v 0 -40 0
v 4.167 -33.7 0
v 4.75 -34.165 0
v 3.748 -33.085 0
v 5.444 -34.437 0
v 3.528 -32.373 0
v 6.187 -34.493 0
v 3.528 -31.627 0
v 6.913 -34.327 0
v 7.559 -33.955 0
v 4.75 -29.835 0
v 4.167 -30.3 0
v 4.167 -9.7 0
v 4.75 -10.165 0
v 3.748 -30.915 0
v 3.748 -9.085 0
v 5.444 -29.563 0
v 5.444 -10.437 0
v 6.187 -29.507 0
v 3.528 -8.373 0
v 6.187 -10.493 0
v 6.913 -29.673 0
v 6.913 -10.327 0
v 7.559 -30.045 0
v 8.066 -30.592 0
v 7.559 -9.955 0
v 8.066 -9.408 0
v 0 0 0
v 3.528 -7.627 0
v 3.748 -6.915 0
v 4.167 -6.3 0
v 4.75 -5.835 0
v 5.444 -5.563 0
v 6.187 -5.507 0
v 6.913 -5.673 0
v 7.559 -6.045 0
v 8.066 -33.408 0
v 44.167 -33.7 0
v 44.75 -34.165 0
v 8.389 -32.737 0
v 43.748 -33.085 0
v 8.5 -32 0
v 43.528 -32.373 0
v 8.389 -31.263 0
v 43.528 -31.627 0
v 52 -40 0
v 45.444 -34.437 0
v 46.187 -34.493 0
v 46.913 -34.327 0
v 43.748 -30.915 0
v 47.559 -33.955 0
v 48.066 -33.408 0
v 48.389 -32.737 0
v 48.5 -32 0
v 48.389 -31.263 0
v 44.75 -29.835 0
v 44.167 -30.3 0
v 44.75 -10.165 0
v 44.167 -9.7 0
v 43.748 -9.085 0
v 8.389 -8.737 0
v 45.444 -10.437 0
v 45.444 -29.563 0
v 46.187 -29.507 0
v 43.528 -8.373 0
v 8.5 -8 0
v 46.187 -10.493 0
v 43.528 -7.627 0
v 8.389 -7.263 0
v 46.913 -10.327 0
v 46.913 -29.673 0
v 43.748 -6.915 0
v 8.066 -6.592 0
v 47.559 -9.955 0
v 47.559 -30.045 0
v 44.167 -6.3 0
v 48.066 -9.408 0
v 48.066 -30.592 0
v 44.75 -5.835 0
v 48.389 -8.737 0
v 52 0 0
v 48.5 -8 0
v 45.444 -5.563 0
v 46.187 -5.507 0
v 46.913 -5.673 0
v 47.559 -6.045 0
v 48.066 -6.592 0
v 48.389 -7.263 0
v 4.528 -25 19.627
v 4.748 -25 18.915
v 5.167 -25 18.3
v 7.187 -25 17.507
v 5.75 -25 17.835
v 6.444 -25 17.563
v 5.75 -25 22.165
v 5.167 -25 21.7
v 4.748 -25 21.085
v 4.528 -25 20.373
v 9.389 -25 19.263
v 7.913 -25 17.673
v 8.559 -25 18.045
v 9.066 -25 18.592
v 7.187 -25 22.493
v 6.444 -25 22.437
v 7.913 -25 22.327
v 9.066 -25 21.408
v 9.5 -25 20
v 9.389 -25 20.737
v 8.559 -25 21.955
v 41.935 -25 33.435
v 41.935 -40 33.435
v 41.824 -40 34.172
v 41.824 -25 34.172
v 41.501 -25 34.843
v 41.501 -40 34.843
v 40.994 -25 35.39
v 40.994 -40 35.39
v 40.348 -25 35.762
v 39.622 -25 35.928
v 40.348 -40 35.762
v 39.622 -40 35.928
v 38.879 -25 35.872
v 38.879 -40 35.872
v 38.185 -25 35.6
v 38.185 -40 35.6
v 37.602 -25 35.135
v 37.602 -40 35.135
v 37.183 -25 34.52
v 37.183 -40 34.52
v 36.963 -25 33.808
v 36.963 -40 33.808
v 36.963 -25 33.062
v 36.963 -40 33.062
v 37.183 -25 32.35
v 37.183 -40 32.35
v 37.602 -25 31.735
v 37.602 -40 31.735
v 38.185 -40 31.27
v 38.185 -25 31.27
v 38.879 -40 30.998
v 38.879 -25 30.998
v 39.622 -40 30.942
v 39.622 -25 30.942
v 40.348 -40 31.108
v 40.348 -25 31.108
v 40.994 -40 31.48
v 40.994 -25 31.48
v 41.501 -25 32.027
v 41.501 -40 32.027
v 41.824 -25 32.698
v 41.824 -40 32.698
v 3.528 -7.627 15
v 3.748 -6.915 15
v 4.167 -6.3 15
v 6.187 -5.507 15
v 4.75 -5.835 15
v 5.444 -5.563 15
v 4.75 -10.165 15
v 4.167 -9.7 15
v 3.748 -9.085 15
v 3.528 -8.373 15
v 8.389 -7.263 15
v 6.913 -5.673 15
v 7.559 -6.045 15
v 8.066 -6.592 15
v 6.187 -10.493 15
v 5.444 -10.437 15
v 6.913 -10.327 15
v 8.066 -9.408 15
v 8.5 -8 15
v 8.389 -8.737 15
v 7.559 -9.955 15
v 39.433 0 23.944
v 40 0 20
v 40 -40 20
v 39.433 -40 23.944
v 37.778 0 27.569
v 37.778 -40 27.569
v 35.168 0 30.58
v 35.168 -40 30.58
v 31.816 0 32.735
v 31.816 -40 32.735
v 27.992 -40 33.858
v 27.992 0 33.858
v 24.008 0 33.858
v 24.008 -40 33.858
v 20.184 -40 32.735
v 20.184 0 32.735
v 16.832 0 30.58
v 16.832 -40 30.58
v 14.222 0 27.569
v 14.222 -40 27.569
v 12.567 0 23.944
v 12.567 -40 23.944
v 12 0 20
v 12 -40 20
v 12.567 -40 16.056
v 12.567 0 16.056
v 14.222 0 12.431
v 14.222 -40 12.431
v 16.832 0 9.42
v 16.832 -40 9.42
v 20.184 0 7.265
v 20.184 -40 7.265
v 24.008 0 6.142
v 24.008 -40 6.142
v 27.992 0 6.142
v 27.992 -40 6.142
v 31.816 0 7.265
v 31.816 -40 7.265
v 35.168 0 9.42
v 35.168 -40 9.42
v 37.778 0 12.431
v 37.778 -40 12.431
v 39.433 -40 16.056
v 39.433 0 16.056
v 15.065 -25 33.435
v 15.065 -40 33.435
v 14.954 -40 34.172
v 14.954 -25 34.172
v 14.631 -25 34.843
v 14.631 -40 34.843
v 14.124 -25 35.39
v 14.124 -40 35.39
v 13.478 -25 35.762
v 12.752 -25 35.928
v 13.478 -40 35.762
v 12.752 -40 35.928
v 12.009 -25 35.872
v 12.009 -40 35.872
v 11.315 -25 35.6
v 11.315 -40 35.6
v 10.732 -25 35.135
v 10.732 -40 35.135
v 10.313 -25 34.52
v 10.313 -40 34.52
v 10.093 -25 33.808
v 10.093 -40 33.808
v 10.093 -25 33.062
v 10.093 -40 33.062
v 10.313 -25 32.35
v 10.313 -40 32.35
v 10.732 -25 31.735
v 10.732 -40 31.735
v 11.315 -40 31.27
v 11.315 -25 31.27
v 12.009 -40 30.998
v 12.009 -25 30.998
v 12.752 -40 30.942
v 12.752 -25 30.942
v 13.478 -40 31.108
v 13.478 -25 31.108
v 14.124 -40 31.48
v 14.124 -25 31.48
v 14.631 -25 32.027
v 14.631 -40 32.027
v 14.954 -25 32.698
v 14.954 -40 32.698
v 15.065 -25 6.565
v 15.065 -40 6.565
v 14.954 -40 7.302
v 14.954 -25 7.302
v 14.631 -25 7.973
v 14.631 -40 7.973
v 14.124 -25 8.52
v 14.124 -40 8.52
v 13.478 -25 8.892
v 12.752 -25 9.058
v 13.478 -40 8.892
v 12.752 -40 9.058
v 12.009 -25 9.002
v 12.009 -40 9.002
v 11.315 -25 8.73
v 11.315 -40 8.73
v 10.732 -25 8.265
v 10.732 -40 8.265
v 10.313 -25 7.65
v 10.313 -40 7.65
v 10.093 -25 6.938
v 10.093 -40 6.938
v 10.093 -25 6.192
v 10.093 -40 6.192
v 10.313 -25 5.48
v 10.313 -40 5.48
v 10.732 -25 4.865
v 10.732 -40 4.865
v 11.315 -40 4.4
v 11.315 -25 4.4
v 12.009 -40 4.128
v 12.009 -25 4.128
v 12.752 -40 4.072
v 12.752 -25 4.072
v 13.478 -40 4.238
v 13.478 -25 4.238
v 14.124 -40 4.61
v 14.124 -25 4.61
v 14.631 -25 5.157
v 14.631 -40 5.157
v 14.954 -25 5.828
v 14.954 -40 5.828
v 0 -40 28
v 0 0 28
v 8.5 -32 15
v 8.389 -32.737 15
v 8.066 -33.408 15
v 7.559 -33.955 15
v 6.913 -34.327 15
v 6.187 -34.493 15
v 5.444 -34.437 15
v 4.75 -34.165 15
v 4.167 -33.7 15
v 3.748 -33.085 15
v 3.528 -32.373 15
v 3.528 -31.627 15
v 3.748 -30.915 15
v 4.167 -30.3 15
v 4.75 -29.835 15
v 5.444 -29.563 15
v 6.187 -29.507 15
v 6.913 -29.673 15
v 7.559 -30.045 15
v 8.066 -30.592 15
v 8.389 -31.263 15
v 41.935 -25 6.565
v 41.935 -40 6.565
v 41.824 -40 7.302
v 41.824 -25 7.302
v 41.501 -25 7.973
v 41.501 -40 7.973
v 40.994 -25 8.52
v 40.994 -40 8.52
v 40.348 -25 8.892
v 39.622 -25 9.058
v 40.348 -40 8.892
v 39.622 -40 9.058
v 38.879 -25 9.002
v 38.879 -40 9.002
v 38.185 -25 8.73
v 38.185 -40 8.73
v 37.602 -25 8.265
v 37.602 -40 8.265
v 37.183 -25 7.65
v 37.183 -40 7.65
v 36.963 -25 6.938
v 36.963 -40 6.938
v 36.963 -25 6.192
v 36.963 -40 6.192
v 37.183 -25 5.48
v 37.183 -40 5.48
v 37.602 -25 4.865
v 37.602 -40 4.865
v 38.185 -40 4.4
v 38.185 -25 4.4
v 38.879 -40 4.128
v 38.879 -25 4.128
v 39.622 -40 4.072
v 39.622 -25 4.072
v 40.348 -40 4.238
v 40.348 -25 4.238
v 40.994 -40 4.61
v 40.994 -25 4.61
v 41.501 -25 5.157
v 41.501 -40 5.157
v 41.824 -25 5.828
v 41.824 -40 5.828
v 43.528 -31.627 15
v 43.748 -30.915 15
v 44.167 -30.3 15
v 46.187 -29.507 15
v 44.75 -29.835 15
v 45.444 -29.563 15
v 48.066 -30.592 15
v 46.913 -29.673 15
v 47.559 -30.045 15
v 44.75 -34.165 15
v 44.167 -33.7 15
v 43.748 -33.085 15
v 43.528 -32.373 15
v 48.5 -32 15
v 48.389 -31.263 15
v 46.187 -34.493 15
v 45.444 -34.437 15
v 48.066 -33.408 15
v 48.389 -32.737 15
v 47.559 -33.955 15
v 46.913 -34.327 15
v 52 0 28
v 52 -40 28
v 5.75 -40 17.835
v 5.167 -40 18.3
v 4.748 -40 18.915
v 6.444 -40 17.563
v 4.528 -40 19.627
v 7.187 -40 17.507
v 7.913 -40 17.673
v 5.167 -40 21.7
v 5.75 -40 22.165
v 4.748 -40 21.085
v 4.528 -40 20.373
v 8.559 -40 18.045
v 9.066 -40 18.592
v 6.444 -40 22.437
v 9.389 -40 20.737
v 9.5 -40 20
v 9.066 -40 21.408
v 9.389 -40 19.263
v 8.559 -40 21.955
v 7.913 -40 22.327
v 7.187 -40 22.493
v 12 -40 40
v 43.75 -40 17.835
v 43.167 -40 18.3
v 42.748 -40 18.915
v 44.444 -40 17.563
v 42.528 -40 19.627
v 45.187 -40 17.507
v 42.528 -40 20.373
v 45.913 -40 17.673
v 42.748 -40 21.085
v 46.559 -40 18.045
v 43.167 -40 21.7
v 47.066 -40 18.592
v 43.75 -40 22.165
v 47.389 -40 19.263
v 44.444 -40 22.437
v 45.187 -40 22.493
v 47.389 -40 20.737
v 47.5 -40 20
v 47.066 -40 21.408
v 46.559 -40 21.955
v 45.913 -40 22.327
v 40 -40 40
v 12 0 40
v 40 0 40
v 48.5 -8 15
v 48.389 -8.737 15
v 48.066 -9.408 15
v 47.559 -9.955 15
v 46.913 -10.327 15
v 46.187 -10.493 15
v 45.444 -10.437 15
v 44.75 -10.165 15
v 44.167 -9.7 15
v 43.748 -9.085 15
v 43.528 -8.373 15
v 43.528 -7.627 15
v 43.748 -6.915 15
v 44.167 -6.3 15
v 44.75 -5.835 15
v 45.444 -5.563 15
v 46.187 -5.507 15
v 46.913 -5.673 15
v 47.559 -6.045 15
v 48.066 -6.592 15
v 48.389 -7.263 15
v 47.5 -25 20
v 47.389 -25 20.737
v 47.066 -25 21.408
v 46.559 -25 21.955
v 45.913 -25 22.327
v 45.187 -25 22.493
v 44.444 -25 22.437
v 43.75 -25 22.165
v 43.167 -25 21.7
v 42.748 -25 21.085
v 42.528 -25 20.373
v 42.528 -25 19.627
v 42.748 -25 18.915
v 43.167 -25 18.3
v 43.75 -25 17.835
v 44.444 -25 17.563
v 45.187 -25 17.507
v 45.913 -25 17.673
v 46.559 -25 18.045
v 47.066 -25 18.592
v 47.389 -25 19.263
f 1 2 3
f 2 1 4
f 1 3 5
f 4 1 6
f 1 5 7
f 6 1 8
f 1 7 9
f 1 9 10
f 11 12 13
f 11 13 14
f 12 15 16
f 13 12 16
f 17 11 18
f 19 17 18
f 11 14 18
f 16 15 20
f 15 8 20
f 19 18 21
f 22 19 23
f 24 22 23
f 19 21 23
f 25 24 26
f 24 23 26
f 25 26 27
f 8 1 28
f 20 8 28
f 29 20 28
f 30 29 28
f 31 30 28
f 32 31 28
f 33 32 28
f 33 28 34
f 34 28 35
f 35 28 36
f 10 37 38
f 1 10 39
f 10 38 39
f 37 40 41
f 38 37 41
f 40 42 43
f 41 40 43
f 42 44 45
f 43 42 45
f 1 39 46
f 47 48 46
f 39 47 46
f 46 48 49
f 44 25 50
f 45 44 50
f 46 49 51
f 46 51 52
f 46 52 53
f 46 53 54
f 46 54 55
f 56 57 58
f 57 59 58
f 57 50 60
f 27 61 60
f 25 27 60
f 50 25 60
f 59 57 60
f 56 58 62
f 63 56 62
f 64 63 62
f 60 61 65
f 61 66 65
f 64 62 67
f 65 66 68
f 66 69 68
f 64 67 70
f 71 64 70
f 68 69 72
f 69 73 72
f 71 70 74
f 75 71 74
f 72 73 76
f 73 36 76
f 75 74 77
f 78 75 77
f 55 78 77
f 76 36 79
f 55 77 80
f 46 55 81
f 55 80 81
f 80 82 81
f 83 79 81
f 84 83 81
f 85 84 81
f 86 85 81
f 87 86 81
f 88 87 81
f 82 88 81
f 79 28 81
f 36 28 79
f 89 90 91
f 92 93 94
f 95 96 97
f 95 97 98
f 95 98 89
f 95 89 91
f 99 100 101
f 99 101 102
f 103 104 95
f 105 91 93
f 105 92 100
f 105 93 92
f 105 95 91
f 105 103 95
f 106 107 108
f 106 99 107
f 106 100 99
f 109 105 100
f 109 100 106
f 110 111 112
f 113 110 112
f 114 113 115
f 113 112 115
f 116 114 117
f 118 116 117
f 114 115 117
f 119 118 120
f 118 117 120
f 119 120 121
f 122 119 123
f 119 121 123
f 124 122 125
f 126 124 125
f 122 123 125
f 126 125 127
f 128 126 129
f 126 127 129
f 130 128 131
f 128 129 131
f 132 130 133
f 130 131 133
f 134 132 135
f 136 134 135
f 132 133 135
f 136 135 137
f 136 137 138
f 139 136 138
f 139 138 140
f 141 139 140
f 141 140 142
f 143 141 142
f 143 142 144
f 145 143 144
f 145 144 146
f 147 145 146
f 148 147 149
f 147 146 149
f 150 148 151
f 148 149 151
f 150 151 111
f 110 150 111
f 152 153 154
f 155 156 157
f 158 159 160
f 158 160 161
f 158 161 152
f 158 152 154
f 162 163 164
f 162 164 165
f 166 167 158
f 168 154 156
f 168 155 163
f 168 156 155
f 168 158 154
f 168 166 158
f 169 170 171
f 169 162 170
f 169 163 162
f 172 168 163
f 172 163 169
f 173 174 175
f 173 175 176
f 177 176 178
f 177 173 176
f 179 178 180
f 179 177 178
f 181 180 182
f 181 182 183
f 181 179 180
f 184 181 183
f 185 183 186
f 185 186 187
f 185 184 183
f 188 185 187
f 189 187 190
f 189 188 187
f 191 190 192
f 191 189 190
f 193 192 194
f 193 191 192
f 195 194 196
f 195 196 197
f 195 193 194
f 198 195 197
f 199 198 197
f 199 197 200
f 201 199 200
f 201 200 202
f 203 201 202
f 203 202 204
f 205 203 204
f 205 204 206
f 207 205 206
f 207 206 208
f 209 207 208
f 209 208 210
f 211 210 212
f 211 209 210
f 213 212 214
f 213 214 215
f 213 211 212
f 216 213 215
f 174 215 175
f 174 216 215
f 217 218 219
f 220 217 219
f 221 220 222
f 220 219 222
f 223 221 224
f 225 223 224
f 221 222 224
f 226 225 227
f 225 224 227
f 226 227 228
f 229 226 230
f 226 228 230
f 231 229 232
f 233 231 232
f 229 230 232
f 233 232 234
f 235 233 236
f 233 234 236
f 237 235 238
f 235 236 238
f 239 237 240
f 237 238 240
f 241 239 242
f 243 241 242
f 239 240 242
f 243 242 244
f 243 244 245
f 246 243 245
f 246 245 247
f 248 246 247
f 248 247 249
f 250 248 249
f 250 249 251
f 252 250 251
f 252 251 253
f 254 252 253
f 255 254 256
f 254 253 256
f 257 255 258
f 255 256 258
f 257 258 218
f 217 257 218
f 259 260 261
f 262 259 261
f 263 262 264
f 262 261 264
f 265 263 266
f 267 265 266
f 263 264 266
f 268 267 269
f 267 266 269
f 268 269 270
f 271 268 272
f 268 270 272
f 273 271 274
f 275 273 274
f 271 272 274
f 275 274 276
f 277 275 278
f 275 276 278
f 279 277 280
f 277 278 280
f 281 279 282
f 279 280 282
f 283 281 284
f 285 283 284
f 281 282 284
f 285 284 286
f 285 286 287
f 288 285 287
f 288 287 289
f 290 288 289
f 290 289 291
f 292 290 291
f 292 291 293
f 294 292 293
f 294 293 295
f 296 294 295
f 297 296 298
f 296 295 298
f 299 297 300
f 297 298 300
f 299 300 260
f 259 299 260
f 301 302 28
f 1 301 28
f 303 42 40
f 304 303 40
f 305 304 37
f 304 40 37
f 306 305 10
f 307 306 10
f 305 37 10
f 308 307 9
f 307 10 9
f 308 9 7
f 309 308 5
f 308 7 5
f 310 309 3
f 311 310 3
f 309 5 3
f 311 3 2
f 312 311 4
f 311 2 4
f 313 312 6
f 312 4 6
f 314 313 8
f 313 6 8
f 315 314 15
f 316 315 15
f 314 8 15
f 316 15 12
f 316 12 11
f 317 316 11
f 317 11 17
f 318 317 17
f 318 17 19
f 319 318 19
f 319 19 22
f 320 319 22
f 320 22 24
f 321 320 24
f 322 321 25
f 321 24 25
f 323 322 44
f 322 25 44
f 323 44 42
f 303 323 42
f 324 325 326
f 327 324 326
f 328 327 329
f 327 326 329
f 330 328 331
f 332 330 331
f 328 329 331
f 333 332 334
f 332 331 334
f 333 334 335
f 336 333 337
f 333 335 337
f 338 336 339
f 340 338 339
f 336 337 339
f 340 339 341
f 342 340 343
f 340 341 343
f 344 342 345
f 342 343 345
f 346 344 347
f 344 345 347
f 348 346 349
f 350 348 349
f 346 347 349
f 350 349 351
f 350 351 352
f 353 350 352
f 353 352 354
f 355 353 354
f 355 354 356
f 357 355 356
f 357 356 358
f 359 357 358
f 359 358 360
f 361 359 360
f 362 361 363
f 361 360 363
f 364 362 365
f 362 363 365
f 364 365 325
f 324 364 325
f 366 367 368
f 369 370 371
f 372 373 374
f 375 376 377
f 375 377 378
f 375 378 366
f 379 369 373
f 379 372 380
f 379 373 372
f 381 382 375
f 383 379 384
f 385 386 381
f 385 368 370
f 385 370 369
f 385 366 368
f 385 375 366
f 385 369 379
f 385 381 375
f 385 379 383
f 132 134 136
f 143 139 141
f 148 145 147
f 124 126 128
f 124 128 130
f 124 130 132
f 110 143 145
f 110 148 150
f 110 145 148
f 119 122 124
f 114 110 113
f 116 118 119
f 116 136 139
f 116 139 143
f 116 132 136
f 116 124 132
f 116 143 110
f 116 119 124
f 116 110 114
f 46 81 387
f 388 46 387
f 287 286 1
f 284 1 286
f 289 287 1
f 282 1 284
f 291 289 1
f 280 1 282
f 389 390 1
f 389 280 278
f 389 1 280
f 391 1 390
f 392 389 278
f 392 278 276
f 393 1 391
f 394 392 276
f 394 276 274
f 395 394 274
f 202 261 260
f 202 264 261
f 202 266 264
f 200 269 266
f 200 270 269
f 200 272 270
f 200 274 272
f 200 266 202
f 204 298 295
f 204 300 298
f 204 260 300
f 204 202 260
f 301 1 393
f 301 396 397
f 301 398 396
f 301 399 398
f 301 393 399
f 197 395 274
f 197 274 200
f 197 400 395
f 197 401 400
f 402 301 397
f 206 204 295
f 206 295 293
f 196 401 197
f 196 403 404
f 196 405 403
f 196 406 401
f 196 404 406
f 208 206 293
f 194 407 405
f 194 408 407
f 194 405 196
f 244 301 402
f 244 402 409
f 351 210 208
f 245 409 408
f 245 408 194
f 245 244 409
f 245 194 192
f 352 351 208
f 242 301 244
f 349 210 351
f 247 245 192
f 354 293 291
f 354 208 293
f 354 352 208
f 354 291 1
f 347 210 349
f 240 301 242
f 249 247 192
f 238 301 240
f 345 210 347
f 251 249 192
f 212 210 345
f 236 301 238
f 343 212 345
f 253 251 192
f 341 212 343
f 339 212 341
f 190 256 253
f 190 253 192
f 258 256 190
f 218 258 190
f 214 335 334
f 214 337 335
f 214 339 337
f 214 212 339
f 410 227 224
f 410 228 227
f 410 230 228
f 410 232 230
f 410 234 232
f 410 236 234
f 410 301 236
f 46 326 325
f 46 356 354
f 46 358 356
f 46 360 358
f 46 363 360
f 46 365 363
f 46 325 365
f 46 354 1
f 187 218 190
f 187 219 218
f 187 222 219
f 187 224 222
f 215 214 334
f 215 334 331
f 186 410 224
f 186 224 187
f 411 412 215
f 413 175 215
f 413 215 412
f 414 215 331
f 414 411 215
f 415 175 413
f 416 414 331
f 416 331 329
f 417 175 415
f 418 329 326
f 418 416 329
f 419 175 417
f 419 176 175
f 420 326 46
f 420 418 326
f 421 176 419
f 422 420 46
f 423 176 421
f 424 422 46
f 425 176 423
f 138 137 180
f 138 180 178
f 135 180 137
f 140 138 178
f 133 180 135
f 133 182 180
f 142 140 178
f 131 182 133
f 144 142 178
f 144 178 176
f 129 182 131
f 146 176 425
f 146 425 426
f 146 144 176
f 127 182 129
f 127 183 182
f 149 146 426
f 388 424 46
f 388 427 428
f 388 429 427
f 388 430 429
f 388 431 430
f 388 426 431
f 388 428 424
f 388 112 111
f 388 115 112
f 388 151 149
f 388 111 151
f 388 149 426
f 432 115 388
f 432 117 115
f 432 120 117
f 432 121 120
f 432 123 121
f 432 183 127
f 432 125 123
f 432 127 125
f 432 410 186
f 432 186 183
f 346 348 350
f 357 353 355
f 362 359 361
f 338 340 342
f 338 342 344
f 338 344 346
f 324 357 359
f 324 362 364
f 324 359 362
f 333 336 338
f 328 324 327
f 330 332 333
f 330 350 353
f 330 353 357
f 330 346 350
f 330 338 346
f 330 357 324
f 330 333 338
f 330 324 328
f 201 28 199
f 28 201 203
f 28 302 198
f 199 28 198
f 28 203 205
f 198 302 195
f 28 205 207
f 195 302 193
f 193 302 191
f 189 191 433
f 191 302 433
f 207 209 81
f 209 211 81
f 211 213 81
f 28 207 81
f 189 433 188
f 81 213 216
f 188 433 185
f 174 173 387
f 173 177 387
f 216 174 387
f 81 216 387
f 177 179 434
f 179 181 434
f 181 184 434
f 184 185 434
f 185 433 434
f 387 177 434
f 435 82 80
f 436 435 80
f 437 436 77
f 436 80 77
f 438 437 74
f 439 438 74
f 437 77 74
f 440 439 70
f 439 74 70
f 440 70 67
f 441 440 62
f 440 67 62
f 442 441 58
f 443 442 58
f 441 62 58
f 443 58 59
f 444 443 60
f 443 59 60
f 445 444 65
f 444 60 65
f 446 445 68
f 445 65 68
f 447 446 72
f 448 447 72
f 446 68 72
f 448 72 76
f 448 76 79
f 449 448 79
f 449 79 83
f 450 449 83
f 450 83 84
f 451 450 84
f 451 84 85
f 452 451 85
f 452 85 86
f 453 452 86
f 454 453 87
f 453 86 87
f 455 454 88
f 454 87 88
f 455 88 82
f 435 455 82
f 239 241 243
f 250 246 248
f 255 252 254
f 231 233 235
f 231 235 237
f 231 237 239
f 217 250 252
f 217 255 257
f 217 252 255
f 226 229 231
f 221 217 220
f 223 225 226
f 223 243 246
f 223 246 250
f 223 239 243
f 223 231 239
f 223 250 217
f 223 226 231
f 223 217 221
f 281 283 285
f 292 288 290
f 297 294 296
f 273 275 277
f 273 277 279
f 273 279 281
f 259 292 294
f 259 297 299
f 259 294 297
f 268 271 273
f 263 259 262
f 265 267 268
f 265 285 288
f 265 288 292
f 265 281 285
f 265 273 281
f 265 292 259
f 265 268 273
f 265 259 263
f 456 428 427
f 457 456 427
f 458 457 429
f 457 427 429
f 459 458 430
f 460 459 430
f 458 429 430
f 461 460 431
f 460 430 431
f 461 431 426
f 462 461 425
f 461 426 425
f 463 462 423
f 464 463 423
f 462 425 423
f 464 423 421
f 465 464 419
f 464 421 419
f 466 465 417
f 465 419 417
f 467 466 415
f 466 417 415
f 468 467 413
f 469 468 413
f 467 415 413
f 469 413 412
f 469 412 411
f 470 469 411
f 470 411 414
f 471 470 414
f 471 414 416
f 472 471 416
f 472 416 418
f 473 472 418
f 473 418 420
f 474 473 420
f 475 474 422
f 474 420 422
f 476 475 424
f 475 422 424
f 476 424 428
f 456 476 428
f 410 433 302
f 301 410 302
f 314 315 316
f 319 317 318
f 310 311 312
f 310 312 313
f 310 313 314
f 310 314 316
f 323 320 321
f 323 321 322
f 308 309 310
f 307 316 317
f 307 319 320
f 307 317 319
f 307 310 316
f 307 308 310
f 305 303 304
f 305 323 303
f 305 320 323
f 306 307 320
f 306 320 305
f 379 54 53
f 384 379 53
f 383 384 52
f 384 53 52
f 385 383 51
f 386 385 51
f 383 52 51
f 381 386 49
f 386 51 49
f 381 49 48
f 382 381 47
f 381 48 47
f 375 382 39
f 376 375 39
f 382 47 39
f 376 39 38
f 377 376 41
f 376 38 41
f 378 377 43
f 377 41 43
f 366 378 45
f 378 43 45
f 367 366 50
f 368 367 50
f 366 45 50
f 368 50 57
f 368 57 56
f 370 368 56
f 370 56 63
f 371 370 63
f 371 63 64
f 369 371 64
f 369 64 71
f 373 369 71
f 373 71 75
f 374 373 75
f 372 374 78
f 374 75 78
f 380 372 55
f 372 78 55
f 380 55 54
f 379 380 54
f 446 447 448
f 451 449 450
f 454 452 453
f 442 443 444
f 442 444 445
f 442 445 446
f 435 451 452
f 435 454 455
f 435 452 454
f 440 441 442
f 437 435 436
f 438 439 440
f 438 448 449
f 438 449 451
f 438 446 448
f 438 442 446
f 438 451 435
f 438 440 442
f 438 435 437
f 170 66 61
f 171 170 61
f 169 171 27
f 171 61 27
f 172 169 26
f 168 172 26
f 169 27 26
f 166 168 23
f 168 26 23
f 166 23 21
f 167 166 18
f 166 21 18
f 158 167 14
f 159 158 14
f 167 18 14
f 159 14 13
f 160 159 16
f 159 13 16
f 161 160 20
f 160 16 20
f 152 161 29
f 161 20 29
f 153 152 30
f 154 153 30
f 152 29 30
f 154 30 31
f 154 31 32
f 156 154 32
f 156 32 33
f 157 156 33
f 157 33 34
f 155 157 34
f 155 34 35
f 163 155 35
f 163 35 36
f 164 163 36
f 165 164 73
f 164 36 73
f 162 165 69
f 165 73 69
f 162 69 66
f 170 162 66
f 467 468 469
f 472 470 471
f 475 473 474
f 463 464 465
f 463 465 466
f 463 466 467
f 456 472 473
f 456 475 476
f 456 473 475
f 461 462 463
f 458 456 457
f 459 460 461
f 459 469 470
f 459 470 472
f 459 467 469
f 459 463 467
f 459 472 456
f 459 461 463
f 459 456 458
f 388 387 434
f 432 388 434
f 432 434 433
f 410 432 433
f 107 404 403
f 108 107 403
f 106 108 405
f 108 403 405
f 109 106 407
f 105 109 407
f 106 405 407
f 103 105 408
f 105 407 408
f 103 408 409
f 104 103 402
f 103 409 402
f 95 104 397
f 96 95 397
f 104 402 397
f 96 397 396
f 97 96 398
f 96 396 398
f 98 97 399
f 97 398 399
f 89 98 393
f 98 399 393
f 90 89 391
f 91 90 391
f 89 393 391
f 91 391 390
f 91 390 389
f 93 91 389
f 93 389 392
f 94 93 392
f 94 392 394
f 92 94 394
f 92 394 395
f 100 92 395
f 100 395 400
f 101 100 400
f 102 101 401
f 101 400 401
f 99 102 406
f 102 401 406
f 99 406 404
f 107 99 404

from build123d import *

# Parameters (mm, degrees)
F0_R     = 14
F1_DEPTH = 40
F2_R     = 2.5
F3_DEPTH = 15
F4_R     = 2.5
F5_DEPTH = 15


with BuildPart() as f1:
    # F0 (on Front) → F1 (new body)
    with BuildSketch(Plane.XZ):
        Polygon((0, 28), (0, 0), (52, 0), (52, 28), (40, 40), (12, 40), align=None)
        with Locations((26, 20)):
            Circle(F0_R, mode=Mode.SUBTRACT)
    extrude(amount=F1_DEPTH)

    # F2 (on face) → F3 (cut)
    with BuildSketch(Plane.XZ.offset(40)):
        with Locations((39.435029, 33.435029)):
            Circle(F2_R)
        with Locations((45, 20)):
            Circle(F2_R)
        with Locations((39.435029, 6.564971)):
            Circle(F2_R)
        with Locations((12.564971, 6.564971)):
            Circle(F2_R)
        with Locations((7, 20)):
            Circle(F2_R)
        with Locations((12.564971, 33.435029)):
            Circle(F2_R)
    extrude(amount=-F3_DEPTH, mode=Mode.SUBTRACT)

    # F4 (on face) → F5 (cut)
    with BuildSketch(Plane(origin=(0, 0, 0), x_dir=(1, 0, 0), z_dir=(0, 0, -1))):
        with Locations((46, 32)):
            Circle(F4_R)
        with Locations((46, 8)):
            Circle(F4_R)
        with Locations((6, 8)):
            Circle(F4_R)
        with Locations((6, 32)):
            Circle(F4_R)
    extrude(amount=-F5_DEPTH, mode=Mode.SUBTRACT)


solid = f1.part
